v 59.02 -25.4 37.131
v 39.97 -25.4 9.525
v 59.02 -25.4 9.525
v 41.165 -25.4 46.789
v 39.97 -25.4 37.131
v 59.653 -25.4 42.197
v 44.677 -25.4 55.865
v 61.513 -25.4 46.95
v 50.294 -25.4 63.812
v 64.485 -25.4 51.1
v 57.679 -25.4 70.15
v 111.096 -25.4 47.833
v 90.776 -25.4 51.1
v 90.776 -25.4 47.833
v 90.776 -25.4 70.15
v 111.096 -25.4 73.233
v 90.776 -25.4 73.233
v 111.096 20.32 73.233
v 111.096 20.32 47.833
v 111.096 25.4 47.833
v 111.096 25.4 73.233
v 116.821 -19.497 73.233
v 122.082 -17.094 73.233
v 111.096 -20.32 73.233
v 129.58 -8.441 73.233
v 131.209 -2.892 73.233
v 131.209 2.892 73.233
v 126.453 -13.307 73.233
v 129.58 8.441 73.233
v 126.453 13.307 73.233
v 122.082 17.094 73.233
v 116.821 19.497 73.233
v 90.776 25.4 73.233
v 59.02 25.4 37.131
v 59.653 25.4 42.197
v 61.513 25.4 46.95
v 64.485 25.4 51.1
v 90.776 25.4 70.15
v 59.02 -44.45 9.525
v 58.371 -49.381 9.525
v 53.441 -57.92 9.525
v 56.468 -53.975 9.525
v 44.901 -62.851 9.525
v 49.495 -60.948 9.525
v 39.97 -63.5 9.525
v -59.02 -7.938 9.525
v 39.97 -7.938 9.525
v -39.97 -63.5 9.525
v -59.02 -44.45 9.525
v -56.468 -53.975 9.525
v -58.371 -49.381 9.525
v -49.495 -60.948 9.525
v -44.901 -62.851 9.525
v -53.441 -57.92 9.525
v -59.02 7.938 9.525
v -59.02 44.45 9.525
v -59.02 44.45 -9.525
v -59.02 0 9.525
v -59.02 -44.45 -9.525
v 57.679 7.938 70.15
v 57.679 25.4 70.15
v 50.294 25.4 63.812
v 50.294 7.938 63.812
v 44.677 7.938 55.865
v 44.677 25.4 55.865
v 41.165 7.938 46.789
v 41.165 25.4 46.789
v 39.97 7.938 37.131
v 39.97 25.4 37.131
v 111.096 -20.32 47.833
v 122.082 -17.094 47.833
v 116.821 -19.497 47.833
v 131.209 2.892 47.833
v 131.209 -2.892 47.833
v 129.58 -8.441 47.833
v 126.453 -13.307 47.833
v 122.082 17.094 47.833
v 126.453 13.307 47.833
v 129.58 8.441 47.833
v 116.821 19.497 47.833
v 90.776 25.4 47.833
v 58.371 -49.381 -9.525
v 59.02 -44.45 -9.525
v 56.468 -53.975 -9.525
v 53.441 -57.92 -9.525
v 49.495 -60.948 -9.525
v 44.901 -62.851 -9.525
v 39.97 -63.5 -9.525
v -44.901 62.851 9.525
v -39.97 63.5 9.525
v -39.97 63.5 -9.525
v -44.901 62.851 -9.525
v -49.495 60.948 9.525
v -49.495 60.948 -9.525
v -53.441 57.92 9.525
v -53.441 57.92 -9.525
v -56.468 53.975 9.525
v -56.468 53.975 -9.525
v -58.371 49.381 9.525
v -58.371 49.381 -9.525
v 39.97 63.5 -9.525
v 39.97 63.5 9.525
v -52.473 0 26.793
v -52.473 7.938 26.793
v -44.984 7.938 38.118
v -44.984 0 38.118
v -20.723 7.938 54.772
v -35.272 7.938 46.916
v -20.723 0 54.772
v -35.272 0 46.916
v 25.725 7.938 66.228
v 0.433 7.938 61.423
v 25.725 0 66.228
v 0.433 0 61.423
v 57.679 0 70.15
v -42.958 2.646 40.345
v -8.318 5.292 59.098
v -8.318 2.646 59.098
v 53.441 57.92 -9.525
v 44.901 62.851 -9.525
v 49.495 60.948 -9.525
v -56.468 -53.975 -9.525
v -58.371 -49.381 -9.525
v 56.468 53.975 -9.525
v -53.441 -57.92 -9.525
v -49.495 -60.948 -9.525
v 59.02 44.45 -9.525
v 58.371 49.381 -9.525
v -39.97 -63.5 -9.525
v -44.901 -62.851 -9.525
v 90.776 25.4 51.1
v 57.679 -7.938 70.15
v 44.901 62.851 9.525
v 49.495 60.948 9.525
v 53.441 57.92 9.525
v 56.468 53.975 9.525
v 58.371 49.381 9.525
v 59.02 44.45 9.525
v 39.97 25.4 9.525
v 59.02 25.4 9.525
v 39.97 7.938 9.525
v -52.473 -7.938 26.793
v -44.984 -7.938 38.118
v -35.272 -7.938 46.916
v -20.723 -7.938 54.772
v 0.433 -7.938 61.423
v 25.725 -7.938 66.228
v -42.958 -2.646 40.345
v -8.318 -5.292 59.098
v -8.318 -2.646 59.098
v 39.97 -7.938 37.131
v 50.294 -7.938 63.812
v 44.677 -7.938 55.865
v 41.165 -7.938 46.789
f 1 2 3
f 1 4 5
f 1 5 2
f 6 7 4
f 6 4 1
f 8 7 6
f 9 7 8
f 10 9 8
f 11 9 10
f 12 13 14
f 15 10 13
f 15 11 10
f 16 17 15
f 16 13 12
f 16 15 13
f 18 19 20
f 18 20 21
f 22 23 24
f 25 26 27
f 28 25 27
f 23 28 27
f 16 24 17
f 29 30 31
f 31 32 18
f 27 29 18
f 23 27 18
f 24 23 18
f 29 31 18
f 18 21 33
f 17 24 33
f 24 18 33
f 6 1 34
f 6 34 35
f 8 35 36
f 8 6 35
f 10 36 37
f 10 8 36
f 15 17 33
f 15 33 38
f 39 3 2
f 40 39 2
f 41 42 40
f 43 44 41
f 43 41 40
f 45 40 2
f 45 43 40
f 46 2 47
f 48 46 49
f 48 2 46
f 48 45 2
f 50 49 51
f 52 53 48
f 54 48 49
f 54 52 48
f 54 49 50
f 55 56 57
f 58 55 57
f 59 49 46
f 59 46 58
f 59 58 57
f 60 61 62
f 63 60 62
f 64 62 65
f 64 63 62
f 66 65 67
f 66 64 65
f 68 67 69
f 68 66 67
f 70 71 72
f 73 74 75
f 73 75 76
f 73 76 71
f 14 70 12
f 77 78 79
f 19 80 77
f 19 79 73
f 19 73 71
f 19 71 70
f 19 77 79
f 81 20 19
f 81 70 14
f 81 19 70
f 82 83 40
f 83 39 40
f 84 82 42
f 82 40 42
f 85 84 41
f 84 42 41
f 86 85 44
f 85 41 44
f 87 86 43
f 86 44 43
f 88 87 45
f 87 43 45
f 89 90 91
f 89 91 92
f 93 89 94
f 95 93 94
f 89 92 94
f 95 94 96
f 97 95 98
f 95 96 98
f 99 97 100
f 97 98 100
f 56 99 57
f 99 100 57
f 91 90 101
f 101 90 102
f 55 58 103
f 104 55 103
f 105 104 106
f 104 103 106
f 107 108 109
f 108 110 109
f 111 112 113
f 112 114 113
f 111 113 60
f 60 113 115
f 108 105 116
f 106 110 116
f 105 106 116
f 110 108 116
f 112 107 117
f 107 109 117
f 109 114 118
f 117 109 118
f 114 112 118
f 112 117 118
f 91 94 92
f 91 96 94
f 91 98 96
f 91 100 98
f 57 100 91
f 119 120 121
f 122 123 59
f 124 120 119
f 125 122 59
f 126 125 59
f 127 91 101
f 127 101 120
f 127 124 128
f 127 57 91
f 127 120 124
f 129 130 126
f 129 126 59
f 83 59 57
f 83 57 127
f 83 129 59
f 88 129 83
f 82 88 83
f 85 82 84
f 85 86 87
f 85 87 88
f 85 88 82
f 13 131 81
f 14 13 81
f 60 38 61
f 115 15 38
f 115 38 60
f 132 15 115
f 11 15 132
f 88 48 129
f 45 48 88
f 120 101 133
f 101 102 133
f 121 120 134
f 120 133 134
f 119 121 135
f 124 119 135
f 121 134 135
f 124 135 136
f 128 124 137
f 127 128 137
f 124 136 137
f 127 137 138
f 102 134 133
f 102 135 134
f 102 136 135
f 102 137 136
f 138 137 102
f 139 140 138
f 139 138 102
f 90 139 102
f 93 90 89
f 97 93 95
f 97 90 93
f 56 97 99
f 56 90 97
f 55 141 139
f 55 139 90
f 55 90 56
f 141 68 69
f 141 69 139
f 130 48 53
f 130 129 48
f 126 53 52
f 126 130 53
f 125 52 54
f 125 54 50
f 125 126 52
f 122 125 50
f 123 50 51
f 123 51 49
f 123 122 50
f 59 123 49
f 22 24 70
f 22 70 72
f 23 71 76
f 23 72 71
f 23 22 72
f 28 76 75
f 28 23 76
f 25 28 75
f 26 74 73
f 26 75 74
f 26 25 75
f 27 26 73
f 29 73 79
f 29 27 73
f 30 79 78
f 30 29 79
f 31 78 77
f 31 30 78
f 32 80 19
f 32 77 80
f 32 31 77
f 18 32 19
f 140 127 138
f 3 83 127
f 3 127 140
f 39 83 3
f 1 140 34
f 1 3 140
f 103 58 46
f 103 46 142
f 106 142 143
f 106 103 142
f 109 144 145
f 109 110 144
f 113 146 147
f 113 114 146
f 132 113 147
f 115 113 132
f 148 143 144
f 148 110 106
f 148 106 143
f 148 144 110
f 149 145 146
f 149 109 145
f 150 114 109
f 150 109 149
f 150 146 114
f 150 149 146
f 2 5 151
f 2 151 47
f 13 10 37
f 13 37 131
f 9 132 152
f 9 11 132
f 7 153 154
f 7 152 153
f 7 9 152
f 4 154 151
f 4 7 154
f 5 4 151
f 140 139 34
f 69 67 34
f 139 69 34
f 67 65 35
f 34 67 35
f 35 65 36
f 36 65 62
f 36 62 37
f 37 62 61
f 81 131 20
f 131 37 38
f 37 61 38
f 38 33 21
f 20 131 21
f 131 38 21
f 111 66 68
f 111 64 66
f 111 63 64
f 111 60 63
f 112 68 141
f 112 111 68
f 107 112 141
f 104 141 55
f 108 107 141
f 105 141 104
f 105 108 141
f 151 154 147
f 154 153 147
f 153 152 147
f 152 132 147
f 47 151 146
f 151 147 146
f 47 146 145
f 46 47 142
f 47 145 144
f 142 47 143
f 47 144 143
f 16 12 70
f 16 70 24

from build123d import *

# Parameters (mm, degrees)
F1_DEPTH = 63.5
F2_DEPTH = 25.4
F3_DEPTH = 7.9375
F4_R     = 19.05
F0_W     = 20.32
F0_H     = 25.4


with BuildPart() as f1:
    # F0 (on Front) → F1 (new body, symmetric)
    with BuildSketch(Plane.XZ):
        Polygon((-59.020348, -9.525), (59.020348, -9.525), (59.020348, 9.525), (39.970348, 9.525), (-59.020348, 9.525), align=None)
    extrude(amount=F1_DEPTH, both=True)

    # F0 (on Front) → F2 (join, symmetric)
    with BuildSketch(Plane.XZ):
        with BuildLine():
            Line((39.970348, 9.525), (59.020348, 9.525))
            Line((59.020348, 9.525), (59.020348, 37.131319))
            ThreePointArc((59.020348, 37.131319), (60.435036, 44.631259), (64.484679, 51.100481))
            Line((64.484679, 51.100481), (90.776205, 51.100481))
            Line((90.776205, 51.100481), (90.776205, 70.150481))
            Line((90.776205, 70.150481), (57.678994, 70.150481))
            ThreePointArc((57.678994, 70.150481), (44.67694, 55.865387), (39.970348, 37.131319))
            Line((39.970348, 37.131319), (39.970348, 9.525))
        make_face()
        Polygon((90.776205, 73.233253), (90.776205, 70.150481), (90.776205, 51.100481), (90.776205, 47.833253), (111.096205, 47.833253), (111.096205, 73.233253), align=None)
    extrude(amount=F2_DEPTH, both=True)

    # F0 (on Front) → F3 (join, symmetric)
    with BuildSketch(Plane.XZ):
        with BuildLine():
            add(Edge.make_bspline(
                [(-59.020348, 9.525), (-47.986072, 47.833253), (-28.256564, 61.492361), (57.678994, 70.150481)],
                knots=[0, 0, 0, 0, 131.507358, 131.507358, 131.507358, 131.507358], degree=3))
            Line((-59.020348, 9.525), (39.970348, 9.525))
            Line((39.970348, 9.525), (39.970348, 37.131319))
            ThreePointArc((39.970348, 37.131319), (44.67694, 55.865387), (57.678994, 70.150481))
        make_face()
    extrude(amount=F3_DEPTH, both=True)

    # F4
    f4_edges = [f1.edges().sort_by_distance(p)[0] for p in [
        (59.020348, -63.5, 0),
        (-59.020348, -63.5, 0),
        (-59.020348, 63.5, 0),
        (59.020348, 63.5, 0),
    ]]
    fillet(f4_edges, radius=F4_R)

    # F0 (on Front) → F5 (revolve)
    with BuildSketch(Plane.XZ):
        with Locations((121.256205, 60.533253)):
            Rectangle(F0_W, F0_H)
    revolve(axis=Axis((111.096205, 0, 60.533253), (0, 0, 1)))


solid = f1.part
